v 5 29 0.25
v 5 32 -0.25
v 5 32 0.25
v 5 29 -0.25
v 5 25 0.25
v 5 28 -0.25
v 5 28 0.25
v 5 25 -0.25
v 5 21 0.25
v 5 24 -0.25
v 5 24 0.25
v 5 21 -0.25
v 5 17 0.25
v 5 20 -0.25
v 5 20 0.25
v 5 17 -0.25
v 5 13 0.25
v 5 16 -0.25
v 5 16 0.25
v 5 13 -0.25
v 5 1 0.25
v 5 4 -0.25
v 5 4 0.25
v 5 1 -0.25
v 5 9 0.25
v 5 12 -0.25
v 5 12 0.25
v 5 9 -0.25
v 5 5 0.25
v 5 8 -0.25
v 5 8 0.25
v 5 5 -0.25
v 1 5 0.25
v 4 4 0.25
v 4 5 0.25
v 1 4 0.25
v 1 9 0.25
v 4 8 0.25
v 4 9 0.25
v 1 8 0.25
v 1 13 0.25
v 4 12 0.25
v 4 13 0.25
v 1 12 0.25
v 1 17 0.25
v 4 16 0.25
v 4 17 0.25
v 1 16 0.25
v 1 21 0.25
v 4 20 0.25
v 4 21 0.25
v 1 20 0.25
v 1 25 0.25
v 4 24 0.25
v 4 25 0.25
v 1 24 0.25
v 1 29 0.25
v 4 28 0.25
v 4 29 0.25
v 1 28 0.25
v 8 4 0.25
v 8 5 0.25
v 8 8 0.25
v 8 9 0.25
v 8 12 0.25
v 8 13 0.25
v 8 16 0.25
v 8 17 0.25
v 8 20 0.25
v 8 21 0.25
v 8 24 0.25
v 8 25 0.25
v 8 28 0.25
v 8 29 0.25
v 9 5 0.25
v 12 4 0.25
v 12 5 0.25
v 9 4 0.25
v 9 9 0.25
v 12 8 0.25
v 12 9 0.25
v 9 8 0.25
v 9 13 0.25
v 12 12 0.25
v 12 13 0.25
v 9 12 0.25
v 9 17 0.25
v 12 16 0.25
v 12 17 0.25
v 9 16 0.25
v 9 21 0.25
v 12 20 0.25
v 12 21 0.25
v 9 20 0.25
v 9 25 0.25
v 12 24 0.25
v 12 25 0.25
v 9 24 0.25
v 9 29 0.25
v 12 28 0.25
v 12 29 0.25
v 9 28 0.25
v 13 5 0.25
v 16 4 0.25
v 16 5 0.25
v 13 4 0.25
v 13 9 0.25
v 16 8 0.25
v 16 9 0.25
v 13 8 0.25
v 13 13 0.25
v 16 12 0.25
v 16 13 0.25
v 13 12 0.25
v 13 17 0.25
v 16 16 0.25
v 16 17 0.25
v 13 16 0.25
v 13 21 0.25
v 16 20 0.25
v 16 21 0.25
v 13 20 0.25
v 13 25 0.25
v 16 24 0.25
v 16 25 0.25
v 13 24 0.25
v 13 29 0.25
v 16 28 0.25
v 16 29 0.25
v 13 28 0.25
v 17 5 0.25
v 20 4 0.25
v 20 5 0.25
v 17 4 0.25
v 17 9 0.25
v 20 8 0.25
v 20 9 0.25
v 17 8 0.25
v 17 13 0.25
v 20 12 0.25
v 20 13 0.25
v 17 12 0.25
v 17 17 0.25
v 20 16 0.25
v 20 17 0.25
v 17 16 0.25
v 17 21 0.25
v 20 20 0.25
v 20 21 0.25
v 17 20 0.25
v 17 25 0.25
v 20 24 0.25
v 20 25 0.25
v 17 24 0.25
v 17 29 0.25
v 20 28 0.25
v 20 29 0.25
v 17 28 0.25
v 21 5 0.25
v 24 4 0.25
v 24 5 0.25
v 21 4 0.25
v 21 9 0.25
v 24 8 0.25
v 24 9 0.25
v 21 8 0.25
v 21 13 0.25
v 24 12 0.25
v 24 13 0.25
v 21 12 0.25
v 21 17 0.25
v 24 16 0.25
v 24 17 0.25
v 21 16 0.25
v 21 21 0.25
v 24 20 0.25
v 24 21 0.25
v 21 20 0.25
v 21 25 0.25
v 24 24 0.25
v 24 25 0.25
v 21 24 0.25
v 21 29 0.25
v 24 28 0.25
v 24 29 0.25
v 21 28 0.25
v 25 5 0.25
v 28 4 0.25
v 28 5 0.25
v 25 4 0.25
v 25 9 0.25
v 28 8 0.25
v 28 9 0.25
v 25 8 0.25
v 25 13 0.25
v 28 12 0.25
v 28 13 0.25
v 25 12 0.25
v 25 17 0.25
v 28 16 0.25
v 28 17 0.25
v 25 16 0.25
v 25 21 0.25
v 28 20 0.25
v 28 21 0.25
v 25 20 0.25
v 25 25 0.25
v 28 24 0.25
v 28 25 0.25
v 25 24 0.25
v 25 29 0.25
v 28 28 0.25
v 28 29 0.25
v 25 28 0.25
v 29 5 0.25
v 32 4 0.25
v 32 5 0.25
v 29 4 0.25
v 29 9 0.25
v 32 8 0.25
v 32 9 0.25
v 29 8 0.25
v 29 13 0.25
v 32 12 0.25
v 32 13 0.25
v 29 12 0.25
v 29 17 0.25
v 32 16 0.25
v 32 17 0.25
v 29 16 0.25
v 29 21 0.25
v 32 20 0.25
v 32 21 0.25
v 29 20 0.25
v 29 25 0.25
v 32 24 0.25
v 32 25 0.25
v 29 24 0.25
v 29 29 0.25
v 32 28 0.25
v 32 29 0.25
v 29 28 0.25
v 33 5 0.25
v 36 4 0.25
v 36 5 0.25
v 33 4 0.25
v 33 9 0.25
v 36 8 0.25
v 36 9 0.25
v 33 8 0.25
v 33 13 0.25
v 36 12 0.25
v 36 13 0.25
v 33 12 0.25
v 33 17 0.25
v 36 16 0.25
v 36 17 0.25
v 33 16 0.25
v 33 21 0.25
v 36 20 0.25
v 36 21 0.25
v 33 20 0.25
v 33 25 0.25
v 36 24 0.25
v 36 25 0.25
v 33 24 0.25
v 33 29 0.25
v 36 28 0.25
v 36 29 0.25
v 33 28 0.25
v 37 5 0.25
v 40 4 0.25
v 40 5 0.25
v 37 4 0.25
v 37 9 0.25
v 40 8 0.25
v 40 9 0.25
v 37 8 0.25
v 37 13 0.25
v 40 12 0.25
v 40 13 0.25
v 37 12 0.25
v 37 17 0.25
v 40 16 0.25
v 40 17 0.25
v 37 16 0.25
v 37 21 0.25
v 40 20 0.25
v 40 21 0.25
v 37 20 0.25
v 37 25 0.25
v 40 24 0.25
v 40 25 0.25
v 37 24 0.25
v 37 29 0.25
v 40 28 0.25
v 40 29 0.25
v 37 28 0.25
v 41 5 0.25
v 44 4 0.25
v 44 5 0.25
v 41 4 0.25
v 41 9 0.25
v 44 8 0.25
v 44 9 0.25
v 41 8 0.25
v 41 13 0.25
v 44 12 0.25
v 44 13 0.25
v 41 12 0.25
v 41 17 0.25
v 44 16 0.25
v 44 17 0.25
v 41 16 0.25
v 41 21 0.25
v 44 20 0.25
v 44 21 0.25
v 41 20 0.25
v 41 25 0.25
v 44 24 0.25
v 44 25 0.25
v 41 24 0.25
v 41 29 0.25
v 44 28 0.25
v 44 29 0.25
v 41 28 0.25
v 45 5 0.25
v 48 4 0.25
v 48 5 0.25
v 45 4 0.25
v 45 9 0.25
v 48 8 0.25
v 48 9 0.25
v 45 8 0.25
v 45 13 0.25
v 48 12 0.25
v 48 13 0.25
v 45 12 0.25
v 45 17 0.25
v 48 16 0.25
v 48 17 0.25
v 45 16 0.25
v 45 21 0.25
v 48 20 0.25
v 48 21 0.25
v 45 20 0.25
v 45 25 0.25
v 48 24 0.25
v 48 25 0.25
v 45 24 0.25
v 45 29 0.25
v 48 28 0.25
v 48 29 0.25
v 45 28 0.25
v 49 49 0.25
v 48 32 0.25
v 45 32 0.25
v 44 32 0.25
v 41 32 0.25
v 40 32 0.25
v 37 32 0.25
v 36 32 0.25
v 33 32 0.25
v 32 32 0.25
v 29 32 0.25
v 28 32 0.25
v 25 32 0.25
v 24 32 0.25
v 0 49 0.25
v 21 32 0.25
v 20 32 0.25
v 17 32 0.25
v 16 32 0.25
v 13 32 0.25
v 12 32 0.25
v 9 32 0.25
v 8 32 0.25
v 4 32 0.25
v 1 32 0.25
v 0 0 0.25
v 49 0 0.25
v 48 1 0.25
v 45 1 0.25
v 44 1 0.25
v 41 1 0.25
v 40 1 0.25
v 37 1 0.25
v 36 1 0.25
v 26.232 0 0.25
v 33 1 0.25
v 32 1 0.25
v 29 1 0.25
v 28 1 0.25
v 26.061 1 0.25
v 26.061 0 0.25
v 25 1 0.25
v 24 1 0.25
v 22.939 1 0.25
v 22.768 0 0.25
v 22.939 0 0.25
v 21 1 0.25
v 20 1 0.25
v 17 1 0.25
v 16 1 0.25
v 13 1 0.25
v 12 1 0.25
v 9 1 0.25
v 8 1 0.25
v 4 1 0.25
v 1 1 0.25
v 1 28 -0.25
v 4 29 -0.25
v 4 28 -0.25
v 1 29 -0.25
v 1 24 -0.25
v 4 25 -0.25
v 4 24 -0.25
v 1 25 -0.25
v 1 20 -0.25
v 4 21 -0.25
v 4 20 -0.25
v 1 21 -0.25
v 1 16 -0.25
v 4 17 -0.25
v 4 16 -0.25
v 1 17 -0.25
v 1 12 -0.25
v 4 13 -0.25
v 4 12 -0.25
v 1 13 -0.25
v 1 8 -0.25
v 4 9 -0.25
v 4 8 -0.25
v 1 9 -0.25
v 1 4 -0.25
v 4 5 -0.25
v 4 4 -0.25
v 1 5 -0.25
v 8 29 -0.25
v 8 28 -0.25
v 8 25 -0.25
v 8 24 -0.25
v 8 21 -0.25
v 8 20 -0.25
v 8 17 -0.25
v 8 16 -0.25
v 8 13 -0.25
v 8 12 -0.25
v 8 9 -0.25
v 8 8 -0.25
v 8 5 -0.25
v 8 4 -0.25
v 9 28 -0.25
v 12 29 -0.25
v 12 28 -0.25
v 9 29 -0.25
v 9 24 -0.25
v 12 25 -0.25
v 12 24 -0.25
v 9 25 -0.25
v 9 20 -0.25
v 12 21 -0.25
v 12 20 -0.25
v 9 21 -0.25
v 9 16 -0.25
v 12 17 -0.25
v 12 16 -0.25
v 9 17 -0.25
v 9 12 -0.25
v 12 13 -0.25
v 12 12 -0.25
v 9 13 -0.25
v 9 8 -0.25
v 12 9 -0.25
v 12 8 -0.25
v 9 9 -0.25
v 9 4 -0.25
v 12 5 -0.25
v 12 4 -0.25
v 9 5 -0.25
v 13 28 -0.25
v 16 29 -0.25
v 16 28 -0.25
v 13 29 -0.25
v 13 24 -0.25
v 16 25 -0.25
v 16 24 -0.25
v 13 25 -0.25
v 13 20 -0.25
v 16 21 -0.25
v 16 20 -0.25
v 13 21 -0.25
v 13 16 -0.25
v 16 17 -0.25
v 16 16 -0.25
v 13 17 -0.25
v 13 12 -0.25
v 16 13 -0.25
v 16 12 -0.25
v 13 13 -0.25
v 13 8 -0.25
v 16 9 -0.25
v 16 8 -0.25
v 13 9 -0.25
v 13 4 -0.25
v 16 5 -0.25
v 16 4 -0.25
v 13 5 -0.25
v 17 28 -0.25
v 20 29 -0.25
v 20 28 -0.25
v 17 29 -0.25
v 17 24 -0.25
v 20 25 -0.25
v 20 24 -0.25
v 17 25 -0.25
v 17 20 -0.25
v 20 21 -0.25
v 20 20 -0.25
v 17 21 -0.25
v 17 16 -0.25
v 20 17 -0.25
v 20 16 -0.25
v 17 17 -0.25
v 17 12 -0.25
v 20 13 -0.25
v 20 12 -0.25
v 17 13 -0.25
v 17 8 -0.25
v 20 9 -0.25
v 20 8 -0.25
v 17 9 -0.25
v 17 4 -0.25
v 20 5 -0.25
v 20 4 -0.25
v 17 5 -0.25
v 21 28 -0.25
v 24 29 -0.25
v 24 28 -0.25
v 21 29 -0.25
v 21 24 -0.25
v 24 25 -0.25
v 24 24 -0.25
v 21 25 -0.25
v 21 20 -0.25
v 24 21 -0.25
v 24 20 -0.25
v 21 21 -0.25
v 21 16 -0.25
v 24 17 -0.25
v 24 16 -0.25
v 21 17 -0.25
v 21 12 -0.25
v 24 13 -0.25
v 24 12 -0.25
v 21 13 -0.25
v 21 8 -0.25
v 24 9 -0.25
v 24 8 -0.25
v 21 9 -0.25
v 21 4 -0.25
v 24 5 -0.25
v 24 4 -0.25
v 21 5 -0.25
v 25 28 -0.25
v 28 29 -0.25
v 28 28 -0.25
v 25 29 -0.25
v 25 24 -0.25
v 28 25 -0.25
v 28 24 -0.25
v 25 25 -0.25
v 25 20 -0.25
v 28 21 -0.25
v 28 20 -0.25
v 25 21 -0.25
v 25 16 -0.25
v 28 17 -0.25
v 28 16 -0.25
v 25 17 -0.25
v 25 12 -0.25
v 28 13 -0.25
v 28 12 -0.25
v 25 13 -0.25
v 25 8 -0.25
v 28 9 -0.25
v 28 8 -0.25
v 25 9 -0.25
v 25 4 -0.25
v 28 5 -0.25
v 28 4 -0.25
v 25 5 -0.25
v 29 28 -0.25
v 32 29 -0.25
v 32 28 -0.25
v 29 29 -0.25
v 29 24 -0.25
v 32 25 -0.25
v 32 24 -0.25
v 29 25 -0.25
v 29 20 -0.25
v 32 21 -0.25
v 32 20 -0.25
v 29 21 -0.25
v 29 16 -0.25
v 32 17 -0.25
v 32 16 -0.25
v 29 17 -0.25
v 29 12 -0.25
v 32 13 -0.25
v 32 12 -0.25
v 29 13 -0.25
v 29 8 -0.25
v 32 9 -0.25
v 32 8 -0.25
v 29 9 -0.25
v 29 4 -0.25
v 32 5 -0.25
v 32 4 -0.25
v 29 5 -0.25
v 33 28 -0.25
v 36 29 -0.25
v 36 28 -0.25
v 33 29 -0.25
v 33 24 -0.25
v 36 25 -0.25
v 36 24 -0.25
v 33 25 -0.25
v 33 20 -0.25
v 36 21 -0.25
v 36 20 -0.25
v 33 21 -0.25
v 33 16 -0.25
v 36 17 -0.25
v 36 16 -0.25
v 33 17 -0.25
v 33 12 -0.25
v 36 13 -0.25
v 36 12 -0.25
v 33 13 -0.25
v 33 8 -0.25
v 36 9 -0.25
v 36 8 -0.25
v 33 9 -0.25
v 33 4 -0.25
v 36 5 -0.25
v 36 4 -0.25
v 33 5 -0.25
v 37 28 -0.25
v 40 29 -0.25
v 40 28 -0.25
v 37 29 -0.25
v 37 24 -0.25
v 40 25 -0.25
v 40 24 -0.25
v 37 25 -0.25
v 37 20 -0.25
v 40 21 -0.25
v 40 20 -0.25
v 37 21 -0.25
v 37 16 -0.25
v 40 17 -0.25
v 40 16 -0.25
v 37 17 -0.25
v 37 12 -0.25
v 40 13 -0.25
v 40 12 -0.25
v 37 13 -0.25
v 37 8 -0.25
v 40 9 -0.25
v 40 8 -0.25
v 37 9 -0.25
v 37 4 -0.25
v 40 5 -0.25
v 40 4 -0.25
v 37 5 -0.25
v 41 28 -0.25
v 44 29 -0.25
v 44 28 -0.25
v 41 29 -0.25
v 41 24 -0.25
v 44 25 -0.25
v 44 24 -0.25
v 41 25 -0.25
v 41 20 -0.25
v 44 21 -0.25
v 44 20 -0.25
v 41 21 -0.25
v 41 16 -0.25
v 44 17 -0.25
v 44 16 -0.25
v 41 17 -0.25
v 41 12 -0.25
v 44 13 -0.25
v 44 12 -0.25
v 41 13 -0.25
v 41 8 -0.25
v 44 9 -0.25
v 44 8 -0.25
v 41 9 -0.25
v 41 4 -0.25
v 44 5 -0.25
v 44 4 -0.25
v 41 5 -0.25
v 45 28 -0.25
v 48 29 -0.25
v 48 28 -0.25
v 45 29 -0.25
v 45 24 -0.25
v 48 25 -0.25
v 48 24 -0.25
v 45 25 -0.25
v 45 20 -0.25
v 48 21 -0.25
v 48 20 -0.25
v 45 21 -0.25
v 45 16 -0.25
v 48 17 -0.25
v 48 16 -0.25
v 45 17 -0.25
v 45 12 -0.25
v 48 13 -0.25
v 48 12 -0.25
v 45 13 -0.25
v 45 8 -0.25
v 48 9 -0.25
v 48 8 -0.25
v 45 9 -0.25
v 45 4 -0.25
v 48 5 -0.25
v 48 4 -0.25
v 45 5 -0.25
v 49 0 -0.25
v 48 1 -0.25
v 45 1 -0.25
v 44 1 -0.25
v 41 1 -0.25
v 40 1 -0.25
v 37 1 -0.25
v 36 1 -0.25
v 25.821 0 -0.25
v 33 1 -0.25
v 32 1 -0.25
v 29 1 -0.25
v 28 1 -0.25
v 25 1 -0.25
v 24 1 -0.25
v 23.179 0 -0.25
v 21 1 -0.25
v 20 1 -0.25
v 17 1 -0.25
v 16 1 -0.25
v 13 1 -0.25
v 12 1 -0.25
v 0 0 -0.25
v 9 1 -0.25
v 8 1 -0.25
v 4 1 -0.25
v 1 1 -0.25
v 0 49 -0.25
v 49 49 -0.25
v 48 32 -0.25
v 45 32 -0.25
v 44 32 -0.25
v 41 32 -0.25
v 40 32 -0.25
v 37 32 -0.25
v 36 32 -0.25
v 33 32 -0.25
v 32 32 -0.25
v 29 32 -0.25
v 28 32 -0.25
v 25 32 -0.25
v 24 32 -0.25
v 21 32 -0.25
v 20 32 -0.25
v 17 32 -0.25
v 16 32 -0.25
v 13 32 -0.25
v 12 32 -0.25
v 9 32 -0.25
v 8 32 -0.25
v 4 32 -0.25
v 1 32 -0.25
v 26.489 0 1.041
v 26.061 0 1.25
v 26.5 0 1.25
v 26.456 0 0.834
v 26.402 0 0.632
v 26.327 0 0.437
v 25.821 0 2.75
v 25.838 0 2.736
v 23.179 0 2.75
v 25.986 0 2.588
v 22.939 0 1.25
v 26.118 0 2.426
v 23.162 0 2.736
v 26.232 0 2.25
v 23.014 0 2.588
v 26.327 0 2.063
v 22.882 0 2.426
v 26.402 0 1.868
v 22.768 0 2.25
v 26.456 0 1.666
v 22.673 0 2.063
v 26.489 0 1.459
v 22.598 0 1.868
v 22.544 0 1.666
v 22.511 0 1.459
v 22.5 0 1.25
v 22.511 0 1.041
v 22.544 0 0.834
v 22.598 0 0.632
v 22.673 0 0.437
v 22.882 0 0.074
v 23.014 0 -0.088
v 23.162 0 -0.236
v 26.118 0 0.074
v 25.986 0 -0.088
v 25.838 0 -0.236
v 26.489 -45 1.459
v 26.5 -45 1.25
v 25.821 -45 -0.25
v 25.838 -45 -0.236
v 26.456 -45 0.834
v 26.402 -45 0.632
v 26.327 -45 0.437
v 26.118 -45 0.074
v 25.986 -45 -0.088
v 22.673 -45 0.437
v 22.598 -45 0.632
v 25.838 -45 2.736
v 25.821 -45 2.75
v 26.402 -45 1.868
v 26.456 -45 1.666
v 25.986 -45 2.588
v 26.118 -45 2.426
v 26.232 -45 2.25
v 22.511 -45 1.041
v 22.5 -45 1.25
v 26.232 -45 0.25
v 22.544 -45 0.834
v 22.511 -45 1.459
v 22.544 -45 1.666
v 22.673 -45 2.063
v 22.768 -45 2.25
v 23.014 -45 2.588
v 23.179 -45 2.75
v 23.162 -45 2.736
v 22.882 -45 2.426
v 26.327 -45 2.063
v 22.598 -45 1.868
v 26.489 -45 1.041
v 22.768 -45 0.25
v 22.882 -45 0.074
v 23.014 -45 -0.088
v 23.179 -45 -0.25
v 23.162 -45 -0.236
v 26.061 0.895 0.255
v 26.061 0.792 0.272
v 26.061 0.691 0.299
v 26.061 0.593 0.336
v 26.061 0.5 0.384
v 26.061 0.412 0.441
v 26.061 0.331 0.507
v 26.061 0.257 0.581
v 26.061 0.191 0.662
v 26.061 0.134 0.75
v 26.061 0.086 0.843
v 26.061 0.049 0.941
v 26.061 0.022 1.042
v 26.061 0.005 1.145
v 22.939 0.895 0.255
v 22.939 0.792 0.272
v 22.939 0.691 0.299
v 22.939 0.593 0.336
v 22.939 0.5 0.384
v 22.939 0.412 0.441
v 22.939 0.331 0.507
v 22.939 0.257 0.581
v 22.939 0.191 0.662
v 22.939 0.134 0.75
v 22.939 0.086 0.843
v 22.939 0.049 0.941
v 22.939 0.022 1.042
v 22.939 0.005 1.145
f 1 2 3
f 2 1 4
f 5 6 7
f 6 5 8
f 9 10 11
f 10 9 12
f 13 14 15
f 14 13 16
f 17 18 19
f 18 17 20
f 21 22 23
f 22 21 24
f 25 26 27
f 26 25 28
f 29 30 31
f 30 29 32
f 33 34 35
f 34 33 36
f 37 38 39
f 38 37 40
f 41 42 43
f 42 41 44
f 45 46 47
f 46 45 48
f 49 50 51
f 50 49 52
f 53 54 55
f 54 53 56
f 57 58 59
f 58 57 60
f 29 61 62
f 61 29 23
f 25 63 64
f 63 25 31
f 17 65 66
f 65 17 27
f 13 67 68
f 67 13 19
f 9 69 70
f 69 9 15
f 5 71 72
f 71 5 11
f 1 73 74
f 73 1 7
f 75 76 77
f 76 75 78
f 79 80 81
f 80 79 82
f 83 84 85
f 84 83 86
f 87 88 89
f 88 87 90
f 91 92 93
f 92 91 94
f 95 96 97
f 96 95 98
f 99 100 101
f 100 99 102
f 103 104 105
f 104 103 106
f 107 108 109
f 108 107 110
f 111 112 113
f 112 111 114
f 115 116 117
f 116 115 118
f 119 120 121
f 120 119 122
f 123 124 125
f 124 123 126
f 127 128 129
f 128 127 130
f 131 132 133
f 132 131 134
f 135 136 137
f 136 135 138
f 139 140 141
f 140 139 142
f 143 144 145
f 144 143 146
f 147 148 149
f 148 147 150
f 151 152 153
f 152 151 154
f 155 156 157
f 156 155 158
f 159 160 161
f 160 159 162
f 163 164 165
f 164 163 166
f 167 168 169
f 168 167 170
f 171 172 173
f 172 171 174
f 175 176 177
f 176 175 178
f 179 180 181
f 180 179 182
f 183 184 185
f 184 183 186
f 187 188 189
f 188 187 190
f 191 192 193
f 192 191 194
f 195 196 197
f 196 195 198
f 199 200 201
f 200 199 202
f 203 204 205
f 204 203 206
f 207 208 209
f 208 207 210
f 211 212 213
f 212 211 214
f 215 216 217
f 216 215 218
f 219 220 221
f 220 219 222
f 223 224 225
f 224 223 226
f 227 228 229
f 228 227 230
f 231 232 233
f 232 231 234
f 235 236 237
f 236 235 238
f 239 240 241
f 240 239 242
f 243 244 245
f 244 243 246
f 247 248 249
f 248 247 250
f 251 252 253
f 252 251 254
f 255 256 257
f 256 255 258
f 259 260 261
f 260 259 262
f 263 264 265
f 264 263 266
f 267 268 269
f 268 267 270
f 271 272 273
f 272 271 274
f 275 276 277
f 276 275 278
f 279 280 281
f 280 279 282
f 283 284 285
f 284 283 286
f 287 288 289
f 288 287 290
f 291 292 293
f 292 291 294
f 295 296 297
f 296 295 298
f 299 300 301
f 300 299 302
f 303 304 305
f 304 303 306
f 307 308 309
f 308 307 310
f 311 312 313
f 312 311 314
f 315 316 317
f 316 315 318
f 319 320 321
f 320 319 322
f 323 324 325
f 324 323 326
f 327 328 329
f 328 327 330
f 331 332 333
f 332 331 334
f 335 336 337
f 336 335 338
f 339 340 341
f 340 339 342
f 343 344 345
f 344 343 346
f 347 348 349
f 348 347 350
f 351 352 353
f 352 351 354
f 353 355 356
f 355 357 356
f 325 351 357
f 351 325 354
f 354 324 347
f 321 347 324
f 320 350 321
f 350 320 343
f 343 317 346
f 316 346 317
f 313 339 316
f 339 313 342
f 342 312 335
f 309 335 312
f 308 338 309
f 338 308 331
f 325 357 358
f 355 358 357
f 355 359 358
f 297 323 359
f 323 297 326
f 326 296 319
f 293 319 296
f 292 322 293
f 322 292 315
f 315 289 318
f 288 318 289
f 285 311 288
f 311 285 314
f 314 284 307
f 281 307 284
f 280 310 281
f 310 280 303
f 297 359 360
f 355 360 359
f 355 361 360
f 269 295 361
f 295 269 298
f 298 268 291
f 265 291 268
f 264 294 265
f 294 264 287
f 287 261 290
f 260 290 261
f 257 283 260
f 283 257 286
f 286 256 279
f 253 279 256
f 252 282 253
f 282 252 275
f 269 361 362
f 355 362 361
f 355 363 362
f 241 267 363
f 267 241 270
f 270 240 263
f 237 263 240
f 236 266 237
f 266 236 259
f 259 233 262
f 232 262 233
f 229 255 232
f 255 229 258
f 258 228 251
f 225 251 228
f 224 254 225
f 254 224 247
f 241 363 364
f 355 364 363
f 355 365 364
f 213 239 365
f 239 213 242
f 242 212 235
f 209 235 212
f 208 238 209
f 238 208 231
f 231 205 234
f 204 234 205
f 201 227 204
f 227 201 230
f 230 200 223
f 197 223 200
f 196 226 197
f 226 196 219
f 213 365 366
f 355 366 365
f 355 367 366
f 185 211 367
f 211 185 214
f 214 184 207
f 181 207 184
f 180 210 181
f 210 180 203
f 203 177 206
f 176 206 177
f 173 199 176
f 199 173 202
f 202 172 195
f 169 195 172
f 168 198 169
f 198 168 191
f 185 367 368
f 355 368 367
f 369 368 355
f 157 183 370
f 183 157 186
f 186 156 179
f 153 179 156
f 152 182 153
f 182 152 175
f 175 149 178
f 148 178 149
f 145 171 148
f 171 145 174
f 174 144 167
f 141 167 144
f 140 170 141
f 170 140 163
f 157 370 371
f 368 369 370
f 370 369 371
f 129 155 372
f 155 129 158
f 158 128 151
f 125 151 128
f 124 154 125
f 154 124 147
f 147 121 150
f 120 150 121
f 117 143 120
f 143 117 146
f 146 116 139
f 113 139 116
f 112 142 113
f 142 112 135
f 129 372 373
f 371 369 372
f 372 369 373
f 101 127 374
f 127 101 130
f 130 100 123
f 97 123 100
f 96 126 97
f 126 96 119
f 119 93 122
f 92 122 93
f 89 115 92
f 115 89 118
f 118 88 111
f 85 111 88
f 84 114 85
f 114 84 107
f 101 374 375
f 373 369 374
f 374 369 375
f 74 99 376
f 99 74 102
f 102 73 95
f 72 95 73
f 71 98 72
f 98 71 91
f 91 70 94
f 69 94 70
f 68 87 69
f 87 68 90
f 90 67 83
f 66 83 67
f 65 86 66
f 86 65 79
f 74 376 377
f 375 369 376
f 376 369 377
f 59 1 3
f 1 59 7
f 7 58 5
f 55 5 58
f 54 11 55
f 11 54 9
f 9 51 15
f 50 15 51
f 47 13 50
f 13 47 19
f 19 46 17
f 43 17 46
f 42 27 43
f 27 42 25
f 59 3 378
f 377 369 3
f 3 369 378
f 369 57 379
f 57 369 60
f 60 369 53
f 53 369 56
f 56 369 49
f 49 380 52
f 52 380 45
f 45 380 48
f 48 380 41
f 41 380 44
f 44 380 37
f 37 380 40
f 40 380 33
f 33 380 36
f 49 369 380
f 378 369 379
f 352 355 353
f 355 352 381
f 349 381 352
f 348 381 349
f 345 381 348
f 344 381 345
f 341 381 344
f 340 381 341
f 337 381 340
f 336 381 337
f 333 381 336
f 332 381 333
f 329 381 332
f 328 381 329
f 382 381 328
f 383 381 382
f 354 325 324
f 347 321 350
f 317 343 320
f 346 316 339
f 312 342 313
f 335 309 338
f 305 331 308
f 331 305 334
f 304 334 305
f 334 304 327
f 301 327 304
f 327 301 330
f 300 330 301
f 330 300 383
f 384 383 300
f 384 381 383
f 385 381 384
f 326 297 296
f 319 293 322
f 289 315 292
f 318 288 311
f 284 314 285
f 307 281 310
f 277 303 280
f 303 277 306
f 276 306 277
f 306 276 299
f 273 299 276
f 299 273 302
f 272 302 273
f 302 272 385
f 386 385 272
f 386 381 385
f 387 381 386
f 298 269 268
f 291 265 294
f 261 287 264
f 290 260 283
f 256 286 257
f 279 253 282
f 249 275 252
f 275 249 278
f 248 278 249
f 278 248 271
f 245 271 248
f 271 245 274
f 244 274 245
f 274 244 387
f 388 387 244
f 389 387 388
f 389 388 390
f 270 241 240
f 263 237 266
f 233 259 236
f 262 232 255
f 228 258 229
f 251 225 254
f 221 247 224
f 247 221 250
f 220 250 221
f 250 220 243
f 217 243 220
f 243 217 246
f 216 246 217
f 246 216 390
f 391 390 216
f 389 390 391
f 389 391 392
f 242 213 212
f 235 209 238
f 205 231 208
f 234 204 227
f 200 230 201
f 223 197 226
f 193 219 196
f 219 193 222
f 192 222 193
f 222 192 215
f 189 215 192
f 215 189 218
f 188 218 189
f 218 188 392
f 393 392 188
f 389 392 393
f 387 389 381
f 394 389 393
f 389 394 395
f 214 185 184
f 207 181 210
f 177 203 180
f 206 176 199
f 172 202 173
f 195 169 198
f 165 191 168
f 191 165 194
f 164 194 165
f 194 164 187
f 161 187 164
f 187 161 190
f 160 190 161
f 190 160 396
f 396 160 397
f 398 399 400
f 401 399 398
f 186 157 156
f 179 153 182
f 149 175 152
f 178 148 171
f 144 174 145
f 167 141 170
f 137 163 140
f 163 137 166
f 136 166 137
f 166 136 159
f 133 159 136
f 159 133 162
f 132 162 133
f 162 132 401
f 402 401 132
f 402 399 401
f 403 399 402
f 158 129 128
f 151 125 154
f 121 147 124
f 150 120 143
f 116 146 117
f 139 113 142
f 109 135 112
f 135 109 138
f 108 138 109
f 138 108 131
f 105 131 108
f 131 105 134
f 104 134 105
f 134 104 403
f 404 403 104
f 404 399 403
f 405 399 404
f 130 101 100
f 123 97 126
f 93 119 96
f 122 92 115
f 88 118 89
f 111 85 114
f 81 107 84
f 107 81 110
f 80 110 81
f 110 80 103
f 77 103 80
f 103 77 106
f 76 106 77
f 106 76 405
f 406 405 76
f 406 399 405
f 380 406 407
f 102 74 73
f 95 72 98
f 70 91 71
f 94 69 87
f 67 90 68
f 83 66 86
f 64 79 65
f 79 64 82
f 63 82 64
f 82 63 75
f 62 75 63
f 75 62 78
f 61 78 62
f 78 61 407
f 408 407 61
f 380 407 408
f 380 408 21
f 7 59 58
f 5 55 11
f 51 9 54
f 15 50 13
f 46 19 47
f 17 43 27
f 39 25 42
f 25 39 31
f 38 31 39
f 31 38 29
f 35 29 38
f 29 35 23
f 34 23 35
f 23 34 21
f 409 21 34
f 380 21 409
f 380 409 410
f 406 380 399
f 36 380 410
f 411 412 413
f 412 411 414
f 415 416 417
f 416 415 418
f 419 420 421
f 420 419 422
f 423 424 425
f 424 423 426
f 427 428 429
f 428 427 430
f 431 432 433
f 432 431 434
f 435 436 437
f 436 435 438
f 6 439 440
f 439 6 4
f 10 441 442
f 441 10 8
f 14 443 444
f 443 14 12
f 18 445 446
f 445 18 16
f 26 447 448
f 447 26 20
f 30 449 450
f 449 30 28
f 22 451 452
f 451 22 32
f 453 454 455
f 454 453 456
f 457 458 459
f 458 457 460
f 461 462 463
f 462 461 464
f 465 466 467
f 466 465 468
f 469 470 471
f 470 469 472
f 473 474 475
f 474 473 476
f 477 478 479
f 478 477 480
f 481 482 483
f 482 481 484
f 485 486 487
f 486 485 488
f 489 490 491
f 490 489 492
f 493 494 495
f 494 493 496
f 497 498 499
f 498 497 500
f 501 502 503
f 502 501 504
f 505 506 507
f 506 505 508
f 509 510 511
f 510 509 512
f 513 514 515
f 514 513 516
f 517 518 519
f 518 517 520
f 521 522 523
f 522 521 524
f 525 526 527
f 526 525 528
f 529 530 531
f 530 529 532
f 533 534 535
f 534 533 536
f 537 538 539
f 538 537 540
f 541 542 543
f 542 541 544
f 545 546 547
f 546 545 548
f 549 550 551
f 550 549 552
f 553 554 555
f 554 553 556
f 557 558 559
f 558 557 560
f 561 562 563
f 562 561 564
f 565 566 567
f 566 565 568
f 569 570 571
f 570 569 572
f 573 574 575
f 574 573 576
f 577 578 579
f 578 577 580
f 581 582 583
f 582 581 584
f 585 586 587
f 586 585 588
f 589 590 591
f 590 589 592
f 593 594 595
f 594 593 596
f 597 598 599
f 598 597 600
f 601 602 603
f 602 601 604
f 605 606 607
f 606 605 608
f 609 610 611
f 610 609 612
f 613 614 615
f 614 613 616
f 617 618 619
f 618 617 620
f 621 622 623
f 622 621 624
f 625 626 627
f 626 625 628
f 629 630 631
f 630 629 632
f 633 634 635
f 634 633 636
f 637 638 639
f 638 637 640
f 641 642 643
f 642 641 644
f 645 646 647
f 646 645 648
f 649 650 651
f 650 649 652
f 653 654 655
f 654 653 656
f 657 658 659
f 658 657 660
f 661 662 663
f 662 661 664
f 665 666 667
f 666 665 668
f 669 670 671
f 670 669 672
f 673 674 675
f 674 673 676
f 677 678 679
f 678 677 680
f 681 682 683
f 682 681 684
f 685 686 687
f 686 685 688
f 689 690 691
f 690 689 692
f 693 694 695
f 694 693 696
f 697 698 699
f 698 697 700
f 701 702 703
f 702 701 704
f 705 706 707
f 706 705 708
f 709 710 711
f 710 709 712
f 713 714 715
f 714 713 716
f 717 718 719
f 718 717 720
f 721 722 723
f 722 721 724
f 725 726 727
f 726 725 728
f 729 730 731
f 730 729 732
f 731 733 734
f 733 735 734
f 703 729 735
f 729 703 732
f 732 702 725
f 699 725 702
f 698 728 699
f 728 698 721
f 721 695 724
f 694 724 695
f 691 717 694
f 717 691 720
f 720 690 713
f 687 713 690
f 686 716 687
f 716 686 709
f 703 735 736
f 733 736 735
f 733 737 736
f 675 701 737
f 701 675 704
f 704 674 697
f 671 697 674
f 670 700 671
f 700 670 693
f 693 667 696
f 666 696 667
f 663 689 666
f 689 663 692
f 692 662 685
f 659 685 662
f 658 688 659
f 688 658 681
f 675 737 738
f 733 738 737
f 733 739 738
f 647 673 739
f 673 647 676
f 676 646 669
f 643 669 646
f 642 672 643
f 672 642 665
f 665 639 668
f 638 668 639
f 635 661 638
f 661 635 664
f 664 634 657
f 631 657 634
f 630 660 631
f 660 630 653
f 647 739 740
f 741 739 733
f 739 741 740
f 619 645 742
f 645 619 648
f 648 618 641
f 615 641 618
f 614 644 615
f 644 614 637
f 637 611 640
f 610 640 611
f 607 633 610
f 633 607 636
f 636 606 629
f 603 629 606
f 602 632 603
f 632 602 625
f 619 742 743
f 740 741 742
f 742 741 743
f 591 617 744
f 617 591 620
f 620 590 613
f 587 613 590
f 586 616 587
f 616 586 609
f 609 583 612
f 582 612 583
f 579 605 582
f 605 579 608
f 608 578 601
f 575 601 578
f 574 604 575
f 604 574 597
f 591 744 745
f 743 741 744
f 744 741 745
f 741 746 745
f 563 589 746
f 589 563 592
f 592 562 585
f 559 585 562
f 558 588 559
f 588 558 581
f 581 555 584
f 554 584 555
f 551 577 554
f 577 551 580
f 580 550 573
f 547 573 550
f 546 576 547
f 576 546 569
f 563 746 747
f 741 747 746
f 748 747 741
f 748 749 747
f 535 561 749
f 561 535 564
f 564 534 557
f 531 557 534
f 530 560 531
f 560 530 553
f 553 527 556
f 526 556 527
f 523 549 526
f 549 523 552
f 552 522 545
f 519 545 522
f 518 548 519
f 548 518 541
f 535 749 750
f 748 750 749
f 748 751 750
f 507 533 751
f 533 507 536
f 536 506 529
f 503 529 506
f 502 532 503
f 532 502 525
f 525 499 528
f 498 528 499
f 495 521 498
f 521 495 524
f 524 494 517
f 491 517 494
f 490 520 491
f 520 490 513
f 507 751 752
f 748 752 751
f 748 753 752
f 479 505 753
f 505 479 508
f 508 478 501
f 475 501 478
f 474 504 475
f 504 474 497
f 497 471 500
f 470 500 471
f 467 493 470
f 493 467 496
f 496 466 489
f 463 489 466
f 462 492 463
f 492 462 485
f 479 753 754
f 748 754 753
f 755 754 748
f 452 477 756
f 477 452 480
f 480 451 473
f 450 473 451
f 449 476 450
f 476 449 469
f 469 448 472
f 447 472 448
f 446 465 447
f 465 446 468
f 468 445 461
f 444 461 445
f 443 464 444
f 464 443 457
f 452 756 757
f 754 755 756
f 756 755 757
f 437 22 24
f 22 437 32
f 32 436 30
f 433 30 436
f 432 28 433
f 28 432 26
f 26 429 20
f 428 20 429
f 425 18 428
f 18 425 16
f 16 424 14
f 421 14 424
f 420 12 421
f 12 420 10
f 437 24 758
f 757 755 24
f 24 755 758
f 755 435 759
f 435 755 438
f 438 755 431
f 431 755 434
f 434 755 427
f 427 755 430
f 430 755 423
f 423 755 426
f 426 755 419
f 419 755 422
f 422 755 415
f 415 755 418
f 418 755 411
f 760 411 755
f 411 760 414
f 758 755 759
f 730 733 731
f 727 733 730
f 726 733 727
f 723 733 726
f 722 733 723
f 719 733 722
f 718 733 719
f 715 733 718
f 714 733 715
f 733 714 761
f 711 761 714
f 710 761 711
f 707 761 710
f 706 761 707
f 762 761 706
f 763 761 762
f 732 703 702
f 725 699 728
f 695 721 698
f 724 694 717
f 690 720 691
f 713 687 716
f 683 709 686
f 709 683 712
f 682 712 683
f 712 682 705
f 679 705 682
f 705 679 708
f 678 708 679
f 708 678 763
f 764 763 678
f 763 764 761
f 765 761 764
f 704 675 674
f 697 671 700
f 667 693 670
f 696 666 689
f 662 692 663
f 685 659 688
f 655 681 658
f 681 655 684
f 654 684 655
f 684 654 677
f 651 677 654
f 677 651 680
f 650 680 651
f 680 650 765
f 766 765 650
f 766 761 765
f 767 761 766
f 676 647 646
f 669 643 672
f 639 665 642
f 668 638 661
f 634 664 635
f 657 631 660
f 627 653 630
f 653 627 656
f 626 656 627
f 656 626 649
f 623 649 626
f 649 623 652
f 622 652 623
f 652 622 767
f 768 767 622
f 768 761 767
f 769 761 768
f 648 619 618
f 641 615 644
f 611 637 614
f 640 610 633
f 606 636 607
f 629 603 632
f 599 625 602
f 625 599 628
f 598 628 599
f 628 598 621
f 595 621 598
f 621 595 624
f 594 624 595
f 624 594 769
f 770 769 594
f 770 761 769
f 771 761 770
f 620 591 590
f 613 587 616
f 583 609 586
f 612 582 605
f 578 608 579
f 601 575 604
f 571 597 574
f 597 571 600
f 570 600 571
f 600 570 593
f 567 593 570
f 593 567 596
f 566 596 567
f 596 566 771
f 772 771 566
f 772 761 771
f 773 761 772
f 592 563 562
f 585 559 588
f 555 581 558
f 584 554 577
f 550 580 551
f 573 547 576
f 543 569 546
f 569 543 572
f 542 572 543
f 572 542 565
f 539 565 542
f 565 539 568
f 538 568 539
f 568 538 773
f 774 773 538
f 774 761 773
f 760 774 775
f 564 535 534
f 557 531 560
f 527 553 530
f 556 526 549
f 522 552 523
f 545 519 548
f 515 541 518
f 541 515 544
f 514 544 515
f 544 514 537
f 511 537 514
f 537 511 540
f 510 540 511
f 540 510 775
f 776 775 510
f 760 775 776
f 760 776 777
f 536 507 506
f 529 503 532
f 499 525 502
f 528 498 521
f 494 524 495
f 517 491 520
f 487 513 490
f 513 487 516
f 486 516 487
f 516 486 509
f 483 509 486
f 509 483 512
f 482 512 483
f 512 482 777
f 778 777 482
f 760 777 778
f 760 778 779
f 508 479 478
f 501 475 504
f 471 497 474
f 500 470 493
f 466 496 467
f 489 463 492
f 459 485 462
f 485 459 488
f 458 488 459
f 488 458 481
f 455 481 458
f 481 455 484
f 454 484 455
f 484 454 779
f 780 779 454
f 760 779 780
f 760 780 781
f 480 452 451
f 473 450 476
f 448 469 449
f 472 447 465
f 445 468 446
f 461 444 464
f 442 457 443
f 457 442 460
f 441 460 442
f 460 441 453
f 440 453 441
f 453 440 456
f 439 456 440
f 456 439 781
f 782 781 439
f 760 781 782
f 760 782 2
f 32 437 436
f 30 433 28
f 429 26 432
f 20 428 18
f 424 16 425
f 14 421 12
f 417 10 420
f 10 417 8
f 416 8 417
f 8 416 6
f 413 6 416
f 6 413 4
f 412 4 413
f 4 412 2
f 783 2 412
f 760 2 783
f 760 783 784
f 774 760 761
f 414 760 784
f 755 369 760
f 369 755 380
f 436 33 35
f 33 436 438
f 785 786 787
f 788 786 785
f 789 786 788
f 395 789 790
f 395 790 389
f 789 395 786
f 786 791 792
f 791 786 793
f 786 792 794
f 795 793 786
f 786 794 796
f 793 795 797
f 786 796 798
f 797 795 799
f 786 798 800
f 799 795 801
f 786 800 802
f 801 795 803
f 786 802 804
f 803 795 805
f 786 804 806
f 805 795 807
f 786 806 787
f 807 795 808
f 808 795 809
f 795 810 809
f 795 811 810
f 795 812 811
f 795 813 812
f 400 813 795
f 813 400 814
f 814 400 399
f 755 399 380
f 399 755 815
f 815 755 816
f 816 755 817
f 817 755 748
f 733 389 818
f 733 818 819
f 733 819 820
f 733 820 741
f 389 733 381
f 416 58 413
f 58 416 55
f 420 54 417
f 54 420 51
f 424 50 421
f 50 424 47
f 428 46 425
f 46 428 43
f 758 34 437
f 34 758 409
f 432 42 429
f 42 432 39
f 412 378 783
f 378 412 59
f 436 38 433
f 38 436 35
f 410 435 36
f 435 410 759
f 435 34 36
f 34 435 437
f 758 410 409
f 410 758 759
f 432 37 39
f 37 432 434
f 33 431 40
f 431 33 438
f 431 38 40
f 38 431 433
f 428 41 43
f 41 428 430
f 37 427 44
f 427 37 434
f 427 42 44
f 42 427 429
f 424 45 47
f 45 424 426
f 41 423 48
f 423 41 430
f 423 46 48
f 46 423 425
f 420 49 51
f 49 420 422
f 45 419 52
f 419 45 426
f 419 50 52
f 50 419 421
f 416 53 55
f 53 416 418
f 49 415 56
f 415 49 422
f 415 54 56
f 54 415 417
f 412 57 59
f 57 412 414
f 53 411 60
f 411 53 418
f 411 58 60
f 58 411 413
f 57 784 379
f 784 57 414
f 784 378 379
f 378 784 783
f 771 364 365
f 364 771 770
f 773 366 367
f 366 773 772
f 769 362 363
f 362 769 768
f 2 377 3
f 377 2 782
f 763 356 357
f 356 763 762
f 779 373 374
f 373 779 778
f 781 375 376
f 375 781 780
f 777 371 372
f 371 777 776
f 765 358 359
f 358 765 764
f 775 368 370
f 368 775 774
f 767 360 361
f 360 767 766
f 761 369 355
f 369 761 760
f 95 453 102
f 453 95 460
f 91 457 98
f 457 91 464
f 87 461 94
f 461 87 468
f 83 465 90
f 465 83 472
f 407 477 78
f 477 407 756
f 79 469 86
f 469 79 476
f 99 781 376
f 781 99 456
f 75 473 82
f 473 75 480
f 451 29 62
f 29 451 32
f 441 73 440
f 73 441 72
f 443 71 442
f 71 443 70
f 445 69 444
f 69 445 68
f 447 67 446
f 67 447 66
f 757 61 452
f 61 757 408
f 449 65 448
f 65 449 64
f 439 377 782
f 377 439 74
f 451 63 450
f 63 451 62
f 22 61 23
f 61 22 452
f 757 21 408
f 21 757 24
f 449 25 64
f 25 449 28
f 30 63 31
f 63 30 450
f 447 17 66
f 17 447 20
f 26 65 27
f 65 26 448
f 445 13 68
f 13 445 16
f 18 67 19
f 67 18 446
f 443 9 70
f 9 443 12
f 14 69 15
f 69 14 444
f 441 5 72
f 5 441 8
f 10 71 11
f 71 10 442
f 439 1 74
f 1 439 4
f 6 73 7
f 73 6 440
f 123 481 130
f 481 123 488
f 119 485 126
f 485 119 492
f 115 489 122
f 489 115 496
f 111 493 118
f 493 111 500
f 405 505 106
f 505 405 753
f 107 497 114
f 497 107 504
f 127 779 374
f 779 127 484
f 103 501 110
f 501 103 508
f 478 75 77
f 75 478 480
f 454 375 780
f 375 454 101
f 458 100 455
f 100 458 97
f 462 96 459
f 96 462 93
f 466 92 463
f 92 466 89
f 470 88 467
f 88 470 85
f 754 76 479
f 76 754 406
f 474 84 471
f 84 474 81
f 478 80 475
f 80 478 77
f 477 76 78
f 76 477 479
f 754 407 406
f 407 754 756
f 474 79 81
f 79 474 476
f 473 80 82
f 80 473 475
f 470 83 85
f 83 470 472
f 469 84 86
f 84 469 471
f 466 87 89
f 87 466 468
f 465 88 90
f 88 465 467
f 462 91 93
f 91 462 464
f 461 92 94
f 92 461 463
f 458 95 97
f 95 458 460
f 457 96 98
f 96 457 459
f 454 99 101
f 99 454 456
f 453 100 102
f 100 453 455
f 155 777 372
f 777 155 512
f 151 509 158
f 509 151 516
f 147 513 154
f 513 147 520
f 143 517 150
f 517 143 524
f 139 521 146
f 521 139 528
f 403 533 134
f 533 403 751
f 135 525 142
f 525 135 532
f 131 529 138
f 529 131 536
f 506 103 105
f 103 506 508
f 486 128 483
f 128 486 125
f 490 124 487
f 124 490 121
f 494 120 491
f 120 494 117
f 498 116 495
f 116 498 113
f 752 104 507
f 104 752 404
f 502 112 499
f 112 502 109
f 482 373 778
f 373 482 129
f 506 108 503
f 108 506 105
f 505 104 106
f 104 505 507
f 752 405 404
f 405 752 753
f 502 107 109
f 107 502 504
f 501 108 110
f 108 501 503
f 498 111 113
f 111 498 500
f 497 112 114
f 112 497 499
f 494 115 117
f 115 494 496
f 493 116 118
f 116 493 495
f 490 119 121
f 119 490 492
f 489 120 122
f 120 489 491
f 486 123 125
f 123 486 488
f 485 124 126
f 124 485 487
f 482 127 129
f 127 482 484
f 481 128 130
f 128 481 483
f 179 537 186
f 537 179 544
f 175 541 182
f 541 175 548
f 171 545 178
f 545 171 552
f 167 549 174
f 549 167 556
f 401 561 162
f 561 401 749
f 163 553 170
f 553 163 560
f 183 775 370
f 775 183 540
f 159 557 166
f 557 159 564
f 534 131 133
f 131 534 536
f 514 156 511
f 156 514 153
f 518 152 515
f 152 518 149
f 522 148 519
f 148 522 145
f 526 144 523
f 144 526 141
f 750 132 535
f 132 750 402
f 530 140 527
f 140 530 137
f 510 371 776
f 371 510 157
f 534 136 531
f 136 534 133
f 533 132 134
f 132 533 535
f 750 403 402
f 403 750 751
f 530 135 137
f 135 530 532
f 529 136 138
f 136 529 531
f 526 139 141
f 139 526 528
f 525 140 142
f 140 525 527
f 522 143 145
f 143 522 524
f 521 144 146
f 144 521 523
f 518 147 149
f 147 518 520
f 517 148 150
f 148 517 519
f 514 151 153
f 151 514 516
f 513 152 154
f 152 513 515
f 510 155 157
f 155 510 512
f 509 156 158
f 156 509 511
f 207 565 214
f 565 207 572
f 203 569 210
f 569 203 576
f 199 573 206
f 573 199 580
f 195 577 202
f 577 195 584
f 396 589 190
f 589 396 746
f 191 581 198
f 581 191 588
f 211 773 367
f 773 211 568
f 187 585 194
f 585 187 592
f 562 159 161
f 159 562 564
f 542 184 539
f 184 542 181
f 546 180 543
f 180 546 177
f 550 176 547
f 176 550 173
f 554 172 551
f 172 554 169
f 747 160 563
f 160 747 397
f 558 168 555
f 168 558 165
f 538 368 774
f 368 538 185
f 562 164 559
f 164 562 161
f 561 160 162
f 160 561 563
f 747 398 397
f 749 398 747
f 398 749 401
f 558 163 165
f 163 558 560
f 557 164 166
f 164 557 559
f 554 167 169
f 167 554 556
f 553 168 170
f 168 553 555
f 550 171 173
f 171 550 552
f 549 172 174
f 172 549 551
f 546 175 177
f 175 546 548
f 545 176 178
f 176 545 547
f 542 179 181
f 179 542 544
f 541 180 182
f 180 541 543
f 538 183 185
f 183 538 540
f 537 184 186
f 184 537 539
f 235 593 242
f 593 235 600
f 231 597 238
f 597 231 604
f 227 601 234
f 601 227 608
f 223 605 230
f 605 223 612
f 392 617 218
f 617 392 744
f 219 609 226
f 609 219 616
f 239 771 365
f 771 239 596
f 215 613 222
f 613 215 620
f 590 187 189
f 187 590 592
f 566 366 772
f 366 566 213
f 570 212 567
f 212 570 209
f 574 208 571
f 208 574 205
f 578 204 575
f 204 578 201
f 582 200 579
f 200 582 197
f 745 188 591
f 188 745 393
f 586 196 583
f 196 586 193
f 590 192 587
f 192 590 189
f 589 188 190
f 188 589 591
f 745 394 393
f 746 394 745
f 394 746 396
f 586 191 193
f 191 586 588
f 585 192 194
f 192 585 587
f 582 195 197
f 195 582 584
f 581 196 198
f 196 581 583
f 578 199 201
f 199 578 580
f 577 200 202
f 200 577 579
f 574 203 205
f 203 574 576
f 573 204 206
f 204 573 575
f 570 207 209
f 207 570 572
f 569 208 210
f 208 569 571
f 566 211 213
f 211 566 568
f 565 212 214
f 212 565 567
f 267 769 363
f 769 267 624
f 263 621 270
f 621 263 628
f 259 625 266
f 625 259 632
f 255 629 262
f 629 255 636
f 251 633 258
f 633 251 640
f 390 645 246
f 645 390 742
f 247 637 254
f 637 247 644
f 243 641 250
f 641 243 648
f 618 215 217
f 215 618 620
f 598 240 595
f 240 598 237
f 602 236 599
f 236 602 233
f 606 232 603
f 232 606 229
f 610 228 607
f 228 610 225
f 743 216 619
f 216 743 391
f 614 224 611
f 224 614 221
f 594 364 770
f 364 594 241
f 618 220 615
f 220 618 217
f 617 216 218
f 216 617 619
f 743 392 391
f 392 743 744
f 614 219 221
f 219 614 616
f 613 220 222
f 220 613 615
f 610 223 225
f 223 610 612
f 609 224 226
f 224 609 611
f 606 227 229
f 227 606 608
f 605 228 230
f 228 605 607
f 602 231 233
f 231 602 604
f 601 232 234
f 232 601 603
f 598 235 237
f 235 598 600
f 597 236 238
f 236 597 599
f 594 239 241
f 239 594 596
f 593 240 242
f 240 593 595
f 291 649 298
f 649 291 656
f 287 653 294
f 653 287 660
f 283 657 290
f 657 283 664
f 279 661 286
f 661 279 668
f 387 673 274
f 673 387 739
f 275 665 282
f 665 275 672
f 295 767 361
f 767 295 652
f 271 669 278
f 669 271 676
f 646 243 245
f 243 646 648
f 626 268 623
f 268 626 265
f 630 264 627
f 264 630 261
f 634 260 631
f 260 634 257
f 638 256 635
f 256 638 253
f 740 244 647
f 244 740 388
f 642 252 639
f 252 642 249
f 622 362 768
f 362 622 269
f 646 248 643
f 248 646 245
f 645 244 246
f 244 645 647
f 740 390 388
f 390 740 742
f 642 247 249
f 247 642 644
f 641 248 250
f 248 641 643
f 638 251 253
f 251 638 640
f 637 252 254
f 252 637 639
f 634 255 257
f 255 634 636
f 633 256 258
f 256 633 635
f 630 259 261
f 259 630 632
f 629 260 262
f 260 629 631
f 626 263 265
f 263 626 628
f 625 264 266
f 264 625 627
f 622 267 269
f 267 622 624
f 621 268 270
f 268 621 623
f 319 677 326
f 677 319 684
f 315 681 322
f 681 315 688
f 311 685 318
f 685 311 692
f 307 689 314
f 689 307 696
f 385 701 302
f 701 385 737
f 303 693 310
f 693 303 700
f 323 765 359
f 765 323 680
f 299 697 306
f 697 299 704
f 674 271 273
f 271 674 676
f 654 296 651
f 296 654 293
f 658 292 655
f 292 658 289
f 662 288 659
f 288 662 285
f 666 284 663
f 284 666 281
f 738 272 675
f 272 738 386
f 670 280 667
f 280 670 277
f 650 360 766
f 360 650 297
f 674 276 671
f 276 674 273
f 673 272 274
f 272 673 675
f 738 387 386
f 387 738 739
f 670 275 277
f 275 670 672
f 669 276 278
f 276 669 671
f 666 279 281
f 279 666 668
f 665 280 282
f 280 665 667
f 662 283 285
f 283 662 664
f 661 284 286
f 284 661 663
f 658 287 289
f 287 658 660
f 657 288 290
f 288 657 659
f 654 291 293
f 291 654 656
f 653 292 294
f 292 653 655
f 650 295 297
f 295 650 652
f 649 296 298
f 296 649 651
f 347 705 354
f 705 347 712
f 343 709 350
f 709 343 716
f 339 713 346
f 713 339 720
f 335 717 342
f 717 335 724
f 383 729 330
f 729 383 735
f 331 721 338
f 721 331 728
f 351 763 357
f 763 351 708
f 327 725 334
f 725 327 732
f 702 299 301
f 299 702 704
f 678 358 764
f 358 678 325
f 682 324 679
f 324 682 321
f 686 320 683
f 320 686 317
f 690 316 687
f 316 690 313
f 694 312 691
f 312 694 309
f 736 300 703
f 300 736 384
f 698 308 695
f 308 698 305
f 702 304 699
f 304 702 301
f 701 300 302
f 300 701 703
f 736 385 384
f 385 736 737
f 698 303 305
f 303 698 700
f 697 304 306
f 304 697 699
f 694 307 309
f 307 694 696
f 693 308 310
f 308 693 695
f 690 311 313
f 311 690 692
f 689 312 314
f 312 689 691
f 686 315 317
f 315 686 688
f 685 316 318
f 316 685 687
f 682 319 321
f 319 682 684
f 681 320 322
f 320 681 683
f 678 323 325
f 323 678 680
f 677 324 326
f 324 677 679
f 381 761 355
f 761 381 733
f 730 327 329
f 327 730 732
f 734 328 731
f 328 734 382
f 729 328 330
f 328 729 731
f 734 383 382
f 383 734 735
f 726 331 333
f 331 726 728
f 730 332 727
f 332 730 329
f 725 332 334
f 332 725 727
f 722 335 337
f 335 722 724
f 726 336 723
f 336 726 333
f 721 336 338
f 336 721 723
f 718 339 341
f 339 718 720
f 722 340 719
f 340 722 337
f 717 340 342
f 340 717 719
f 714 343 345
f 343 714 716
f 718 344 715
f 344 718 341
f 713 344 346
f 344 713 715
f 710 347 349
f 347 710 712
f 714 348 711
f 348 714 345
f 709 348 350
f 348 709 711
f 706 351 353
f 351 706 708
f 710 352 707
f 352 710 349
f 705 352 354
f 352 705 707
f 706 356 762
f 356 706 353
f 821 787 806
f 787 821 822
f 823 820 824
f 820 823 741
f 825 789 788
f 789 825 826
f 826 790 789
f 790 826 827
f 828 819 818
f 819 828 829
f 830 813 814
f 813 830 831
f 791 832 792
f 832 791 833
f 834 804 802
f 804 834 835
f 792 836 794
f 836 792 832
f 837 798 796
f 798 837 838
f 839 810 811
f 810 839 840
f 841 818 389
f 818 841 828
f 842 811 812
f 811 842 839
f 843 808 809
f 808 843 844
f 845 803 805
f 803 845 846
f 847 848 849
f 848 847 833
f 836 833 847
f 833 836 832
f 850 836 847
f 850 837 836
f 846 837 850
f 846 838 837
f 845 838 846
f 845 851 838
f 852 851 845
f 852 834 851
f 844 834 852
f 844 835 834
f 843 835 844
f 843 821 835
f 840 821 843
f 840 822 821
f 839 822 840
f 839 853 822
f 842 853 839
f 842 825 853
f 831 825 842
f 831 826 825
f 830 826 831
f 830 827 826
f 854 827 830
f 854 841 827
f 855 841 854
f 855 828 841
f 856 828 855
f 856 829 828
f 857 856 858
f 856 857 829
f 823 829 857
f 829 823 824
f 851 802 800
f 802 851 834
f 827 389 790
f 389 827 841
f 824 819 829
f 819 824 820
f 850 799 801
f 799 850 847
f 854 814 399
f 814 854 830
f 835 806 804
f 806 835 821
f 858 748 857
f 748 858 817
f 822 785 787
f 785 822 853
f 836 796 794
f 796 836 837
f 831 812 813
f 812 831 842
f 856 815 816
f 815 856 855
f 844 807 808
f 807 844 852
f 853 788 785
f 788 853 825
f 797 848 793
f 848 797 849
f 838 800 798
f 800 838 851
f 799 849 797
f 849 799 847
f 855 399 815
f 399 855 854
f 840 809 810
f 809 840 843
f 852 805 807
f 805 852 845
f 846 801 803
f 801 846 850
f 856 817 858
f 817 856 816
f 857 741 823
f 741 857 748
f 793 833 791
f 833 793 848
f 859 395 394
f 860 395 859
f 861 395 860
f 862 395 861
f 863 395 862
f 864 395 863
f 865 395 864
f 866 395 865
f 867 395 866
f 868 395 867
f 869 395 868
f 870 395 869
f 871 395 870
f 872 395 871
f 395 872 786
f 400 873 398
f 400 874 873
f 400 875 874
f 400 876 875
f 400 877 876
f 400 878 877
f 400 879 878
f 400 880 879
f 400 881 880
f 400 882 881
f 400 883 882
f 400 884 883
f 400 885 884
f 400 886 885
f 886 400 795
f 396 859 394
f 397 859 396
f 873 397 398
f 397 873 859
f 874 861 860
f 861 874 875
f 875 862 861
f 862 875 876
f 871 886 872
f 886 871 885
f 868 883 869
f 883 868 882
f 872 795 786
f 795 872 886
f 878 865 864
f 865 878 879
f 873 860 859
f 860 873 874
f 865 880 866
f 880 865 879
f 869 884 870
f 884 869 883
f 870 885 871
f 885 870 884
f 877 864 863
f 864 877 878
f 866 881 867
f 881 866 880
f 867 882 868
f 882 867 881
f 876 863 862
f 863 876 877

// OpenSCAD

gridSize = 5;
gridHole = 3;
gridWidth = 12;
griddedLength = 8;
ungriddedLength = 4;
gridThickness = 0.5;

handleHeight = 45;
handleDiameter = 4;


module grid(bGrid) {
    difference() {
        cube([gridSize,gridSize,gridThickness],center=true);
        if (bGrid==true) {
            cube([gridHole,gridHole,gridThickness+0.1],center=true);
        }
    }
}
translate([-gridHole/2,-gridHole/2,0])
for (i=[1:gridWidth]) {
    for (j=[1:griddedLength]) {
        translate([(gridSize)*i-(gridSize-gridHole)/2*i,(gridSize)*j-(gridSize-gridHole)/2*j,0])
        grid(true);
    }
    if (ungriddedLength > 0) {
        for (j=[griddedLength+1:griddedLength+ungriddedLength]) {
            translate([(gridSize)*i-(gridSize-gridHole)/2*i,(gridSize)*j-(gridSize-gridHole)/2*j,0])
            grid(false);
        }
    }
}

$fn=60;
gridEdge = (gridSize-gridHole)/2;
echo(gridEdge);
modelWidth = (gridSize-(gridSize-gridHole)/2)*(gridWidth-1)+gridSize;
translate([modelWidth/2,-handleHeight/2,handleDiameter/2-handleDiameter/8-gridThickness/2])
rotate([90,90,0])
difference() {
    cylinder(d=handleDiameter, h=handleHeight, center=true);
    translate([7*handleDiameter/8,0,0])
    cube([handleDiameter,handleDiameter,handleHeight+1],center=true);
    translate([-7*handleDiameter/8,0,0])
    cube([handleDiameter,handleDiameter,handleHeight+1],center=true);
}

handleRadius = handleDiameter/2;
filletLength = 2*sqrt(pow(handleRadius,2)-pow(5*handleRadius/8,2));
filletSize = gridEdge>handleRadius?handleRadius:gridEdge;
translate([modelWidth/2,filletSize/2,filletSize/2+gridThickness/2])
difference() {
    cube([filletLength,filletSize,filletSize],center=true);
    translate([0,filletSize/2,filletSize/2])
    rotate([0,90,0])
    cylinder(h=filletLength+1,d=filletSize*2,center=true);
}
